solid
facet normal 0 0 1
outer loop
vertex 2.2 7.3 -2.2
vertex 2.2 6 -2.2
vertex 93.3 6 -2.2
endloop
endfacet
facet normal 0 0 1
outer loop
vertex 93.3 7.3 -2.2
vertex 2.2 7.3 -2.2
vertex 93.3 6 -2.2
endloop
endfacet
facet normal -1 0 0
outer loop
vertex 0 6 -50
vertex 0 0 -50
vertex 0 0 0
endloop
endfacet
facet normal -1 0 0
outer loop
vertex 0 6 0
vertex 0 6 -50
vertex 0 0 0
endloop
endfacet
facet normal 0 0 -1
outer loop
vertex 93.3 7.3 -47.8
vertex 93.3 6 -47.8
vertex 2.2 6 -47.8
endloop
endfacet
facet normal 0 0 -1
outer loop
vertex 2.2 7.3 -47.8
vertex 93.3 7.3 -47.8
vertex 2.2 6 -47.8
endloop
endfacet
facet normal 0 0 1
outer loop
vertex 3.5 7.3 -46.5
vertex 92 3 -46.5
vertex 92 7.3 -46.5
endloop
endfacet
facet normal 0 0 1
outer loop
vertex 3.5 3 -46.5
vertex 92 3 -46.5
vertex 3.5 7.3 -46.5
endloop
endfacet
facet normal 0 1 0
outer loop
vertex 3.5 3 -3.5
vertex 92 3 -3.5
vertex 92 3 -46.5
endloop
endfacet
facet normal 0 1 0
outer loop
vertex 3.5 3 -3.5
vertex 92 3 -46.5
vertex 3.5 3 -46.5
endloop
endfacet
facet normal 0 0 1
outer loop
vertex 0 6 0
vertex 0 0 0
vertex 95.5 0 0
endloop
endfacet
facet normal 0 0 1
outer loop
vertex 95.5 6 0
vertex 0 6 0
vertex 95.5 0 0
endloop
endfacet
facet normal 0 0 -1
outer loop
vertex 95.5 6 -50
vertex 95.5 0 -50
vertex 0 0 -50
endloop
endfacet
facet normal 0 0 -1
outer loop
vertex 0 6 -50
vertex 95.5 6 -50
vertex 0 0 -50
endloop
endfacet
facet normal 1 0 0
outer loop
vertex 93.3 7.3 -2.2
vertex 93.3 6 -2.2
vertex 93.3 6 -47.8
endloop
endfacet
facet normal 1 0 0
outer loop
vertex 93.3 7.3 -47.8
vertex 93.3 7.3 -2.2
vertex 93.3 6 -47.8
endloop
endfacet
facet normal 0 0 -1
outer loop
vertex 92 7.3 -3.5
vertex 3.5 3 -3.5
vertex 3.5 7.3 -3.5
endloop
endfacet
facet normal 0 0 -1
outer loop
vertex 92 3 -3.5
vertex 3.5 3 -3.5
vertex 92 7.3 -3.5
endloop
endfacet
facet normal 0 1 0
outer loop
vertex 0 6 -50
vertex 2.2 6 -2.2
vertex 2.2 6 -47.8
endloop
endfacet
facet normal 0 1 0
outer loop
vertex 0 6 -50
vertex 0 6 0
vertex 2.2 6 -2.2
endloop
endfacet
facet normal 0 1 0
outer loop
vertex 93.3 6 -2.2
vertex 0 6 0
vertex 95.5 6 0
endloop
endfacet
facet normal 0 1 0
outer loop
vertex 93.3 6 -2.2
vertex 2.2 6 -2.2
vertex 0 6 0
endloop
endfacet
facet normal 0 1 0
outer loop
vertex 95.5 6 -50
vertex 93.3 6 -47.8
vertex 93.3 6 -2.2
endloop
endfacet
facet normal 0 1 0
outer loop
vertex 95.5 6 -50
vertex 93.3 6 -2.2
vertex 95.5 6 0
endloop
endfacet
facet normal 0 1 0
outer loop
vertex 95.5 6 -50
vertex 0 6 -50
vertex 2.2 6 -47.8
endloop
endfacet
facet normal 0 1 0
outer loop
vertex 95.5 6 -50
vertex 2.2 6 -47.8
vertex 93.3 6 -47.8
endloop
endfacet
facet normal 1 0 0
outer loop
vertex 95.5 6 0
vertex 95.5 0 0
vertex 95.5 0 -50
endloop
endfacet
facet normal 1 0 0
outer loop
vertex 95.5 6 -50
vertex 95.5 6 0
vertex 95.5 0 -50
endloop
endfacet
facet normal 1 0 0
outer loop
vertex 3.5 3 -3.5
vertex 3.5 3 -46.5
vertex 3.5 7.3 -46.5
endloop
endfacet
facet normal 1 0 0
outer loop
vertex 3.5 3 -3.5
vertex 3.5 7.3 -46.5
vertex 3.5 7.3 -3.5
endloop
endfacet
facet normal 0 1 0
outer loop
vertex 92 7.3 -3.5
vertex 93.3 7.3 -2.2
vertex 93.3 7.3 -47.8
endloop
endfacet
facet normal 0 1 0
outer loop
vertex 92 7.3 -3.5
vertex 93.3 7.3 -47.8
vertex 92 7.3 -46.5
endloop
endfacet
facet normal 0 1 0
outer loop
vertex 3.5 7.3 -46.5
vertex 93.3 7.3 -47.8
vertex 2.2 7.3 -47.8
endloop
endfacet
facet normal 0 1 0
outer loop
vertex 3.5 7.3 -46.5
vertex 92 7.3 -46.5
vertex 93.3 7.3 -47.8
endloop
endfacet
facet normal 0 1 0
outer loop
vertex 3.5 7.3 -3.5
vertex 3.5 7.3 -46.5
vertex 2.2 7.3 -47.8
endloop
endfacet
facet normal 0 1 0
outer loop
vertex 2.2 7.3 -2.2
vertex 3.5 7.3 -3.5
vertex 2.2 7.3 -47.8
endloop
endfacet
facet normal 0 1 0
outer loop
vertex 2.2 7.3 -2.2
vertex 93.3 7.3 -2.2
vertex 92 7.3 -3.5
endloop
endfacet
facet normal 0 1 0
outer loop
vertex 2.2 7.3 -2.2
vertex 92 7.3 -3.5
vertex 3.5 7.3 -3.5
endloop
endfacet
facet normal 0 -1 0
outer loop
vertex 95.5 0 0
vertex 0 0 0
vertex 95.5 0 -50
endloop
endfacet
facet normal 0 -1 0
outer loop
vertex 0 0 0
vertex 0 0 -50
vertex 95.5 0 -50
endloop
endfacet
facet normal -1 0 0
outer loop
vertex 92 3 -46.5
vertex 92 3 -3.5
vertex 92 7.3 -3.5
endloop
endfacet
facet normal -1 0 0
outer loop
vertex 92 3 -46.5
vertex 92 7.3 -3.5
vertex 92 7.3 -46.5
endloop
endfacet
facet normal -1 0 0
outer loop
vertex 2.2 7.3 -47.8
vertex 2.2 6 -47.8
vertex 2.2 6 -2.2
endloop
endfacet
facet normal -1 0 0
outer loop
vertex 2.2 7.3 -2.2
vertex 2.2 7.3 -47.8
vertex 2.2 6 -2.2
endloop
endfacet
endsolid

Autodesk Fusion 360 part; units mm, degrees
sketch "Sketch1" plane through (0, 0, 0) normal (0, 1, 0) x (1, 0, 0)
  line L0 (0, 0) -> (95.5, 0)
  line L1 (95.5, 0) -> (95.5, 50)
  line L2 (95.5, 50) -> (0, 50)
  line L3 (0, 50) -> (0, 0)
  dimension "d1" = 95.5
  dimension "d2" = 50
extrude "Extrude1" add sketch "Sketch1" along normal blind 6
sketch "Sketch3" plane through (0, 6, 0) normal (0, 1, 0) x (-1, 0, 0)
  line L0 (0, -50) -> (0, 0)
  line L1 (0, 0) -> (-95.5, 0)
  line L2 (-95.5, 0) -> (-95.5, -50)
  line L3 (-95.5, -50) -> (0, -50)
  line L4 (-2.2, -2.2) -> (-93.3, -2.2)
  line L5 (-93.3, -2.2) -> (-93.3, -47.8)
  line L6 (-93.3, -47.8) -> (-2.2, -47.8)
  line L7 (-2.2, -47.8) -> (-2.2, -2.2)
  dimension "d7" = 91.1
  dimension "d8" = 45.6
extrude "Extrude2" cut sketch "Sketch3" against normal blind 3 contours L4 L5 L6 L7
sketch "Sketch4" plane through (0, 3, 0) normal (0, 1, 0) x (-1, 0, 0)
  line L0 (-2.2, -47.8) -> (-2.2, -2.2)
  line L1 (-2.2, -2.2) -> (-93.3, -2.2)
  line L2 (-93.3, -2.2) -> (-93.3, -47.8)
  line L3 (-93.3, -47.8) -> (-2.2, -47.8)
  line L4 (-3.5, -3.5) -> (-92, -3.5)
  line L5 (-92, -3.5) -> (-92, -46.5)
  line L6 (-92, -46.5) -> (-3.5, -46.5)
  line L7 (-3.5, -46.5) -> (-3.5, -3.5)
  dimension "d11" = 88.5
  dimension "d12" = 43
extrude "Extrude3" add sketch "Sketch4" along normal blind 4.3
